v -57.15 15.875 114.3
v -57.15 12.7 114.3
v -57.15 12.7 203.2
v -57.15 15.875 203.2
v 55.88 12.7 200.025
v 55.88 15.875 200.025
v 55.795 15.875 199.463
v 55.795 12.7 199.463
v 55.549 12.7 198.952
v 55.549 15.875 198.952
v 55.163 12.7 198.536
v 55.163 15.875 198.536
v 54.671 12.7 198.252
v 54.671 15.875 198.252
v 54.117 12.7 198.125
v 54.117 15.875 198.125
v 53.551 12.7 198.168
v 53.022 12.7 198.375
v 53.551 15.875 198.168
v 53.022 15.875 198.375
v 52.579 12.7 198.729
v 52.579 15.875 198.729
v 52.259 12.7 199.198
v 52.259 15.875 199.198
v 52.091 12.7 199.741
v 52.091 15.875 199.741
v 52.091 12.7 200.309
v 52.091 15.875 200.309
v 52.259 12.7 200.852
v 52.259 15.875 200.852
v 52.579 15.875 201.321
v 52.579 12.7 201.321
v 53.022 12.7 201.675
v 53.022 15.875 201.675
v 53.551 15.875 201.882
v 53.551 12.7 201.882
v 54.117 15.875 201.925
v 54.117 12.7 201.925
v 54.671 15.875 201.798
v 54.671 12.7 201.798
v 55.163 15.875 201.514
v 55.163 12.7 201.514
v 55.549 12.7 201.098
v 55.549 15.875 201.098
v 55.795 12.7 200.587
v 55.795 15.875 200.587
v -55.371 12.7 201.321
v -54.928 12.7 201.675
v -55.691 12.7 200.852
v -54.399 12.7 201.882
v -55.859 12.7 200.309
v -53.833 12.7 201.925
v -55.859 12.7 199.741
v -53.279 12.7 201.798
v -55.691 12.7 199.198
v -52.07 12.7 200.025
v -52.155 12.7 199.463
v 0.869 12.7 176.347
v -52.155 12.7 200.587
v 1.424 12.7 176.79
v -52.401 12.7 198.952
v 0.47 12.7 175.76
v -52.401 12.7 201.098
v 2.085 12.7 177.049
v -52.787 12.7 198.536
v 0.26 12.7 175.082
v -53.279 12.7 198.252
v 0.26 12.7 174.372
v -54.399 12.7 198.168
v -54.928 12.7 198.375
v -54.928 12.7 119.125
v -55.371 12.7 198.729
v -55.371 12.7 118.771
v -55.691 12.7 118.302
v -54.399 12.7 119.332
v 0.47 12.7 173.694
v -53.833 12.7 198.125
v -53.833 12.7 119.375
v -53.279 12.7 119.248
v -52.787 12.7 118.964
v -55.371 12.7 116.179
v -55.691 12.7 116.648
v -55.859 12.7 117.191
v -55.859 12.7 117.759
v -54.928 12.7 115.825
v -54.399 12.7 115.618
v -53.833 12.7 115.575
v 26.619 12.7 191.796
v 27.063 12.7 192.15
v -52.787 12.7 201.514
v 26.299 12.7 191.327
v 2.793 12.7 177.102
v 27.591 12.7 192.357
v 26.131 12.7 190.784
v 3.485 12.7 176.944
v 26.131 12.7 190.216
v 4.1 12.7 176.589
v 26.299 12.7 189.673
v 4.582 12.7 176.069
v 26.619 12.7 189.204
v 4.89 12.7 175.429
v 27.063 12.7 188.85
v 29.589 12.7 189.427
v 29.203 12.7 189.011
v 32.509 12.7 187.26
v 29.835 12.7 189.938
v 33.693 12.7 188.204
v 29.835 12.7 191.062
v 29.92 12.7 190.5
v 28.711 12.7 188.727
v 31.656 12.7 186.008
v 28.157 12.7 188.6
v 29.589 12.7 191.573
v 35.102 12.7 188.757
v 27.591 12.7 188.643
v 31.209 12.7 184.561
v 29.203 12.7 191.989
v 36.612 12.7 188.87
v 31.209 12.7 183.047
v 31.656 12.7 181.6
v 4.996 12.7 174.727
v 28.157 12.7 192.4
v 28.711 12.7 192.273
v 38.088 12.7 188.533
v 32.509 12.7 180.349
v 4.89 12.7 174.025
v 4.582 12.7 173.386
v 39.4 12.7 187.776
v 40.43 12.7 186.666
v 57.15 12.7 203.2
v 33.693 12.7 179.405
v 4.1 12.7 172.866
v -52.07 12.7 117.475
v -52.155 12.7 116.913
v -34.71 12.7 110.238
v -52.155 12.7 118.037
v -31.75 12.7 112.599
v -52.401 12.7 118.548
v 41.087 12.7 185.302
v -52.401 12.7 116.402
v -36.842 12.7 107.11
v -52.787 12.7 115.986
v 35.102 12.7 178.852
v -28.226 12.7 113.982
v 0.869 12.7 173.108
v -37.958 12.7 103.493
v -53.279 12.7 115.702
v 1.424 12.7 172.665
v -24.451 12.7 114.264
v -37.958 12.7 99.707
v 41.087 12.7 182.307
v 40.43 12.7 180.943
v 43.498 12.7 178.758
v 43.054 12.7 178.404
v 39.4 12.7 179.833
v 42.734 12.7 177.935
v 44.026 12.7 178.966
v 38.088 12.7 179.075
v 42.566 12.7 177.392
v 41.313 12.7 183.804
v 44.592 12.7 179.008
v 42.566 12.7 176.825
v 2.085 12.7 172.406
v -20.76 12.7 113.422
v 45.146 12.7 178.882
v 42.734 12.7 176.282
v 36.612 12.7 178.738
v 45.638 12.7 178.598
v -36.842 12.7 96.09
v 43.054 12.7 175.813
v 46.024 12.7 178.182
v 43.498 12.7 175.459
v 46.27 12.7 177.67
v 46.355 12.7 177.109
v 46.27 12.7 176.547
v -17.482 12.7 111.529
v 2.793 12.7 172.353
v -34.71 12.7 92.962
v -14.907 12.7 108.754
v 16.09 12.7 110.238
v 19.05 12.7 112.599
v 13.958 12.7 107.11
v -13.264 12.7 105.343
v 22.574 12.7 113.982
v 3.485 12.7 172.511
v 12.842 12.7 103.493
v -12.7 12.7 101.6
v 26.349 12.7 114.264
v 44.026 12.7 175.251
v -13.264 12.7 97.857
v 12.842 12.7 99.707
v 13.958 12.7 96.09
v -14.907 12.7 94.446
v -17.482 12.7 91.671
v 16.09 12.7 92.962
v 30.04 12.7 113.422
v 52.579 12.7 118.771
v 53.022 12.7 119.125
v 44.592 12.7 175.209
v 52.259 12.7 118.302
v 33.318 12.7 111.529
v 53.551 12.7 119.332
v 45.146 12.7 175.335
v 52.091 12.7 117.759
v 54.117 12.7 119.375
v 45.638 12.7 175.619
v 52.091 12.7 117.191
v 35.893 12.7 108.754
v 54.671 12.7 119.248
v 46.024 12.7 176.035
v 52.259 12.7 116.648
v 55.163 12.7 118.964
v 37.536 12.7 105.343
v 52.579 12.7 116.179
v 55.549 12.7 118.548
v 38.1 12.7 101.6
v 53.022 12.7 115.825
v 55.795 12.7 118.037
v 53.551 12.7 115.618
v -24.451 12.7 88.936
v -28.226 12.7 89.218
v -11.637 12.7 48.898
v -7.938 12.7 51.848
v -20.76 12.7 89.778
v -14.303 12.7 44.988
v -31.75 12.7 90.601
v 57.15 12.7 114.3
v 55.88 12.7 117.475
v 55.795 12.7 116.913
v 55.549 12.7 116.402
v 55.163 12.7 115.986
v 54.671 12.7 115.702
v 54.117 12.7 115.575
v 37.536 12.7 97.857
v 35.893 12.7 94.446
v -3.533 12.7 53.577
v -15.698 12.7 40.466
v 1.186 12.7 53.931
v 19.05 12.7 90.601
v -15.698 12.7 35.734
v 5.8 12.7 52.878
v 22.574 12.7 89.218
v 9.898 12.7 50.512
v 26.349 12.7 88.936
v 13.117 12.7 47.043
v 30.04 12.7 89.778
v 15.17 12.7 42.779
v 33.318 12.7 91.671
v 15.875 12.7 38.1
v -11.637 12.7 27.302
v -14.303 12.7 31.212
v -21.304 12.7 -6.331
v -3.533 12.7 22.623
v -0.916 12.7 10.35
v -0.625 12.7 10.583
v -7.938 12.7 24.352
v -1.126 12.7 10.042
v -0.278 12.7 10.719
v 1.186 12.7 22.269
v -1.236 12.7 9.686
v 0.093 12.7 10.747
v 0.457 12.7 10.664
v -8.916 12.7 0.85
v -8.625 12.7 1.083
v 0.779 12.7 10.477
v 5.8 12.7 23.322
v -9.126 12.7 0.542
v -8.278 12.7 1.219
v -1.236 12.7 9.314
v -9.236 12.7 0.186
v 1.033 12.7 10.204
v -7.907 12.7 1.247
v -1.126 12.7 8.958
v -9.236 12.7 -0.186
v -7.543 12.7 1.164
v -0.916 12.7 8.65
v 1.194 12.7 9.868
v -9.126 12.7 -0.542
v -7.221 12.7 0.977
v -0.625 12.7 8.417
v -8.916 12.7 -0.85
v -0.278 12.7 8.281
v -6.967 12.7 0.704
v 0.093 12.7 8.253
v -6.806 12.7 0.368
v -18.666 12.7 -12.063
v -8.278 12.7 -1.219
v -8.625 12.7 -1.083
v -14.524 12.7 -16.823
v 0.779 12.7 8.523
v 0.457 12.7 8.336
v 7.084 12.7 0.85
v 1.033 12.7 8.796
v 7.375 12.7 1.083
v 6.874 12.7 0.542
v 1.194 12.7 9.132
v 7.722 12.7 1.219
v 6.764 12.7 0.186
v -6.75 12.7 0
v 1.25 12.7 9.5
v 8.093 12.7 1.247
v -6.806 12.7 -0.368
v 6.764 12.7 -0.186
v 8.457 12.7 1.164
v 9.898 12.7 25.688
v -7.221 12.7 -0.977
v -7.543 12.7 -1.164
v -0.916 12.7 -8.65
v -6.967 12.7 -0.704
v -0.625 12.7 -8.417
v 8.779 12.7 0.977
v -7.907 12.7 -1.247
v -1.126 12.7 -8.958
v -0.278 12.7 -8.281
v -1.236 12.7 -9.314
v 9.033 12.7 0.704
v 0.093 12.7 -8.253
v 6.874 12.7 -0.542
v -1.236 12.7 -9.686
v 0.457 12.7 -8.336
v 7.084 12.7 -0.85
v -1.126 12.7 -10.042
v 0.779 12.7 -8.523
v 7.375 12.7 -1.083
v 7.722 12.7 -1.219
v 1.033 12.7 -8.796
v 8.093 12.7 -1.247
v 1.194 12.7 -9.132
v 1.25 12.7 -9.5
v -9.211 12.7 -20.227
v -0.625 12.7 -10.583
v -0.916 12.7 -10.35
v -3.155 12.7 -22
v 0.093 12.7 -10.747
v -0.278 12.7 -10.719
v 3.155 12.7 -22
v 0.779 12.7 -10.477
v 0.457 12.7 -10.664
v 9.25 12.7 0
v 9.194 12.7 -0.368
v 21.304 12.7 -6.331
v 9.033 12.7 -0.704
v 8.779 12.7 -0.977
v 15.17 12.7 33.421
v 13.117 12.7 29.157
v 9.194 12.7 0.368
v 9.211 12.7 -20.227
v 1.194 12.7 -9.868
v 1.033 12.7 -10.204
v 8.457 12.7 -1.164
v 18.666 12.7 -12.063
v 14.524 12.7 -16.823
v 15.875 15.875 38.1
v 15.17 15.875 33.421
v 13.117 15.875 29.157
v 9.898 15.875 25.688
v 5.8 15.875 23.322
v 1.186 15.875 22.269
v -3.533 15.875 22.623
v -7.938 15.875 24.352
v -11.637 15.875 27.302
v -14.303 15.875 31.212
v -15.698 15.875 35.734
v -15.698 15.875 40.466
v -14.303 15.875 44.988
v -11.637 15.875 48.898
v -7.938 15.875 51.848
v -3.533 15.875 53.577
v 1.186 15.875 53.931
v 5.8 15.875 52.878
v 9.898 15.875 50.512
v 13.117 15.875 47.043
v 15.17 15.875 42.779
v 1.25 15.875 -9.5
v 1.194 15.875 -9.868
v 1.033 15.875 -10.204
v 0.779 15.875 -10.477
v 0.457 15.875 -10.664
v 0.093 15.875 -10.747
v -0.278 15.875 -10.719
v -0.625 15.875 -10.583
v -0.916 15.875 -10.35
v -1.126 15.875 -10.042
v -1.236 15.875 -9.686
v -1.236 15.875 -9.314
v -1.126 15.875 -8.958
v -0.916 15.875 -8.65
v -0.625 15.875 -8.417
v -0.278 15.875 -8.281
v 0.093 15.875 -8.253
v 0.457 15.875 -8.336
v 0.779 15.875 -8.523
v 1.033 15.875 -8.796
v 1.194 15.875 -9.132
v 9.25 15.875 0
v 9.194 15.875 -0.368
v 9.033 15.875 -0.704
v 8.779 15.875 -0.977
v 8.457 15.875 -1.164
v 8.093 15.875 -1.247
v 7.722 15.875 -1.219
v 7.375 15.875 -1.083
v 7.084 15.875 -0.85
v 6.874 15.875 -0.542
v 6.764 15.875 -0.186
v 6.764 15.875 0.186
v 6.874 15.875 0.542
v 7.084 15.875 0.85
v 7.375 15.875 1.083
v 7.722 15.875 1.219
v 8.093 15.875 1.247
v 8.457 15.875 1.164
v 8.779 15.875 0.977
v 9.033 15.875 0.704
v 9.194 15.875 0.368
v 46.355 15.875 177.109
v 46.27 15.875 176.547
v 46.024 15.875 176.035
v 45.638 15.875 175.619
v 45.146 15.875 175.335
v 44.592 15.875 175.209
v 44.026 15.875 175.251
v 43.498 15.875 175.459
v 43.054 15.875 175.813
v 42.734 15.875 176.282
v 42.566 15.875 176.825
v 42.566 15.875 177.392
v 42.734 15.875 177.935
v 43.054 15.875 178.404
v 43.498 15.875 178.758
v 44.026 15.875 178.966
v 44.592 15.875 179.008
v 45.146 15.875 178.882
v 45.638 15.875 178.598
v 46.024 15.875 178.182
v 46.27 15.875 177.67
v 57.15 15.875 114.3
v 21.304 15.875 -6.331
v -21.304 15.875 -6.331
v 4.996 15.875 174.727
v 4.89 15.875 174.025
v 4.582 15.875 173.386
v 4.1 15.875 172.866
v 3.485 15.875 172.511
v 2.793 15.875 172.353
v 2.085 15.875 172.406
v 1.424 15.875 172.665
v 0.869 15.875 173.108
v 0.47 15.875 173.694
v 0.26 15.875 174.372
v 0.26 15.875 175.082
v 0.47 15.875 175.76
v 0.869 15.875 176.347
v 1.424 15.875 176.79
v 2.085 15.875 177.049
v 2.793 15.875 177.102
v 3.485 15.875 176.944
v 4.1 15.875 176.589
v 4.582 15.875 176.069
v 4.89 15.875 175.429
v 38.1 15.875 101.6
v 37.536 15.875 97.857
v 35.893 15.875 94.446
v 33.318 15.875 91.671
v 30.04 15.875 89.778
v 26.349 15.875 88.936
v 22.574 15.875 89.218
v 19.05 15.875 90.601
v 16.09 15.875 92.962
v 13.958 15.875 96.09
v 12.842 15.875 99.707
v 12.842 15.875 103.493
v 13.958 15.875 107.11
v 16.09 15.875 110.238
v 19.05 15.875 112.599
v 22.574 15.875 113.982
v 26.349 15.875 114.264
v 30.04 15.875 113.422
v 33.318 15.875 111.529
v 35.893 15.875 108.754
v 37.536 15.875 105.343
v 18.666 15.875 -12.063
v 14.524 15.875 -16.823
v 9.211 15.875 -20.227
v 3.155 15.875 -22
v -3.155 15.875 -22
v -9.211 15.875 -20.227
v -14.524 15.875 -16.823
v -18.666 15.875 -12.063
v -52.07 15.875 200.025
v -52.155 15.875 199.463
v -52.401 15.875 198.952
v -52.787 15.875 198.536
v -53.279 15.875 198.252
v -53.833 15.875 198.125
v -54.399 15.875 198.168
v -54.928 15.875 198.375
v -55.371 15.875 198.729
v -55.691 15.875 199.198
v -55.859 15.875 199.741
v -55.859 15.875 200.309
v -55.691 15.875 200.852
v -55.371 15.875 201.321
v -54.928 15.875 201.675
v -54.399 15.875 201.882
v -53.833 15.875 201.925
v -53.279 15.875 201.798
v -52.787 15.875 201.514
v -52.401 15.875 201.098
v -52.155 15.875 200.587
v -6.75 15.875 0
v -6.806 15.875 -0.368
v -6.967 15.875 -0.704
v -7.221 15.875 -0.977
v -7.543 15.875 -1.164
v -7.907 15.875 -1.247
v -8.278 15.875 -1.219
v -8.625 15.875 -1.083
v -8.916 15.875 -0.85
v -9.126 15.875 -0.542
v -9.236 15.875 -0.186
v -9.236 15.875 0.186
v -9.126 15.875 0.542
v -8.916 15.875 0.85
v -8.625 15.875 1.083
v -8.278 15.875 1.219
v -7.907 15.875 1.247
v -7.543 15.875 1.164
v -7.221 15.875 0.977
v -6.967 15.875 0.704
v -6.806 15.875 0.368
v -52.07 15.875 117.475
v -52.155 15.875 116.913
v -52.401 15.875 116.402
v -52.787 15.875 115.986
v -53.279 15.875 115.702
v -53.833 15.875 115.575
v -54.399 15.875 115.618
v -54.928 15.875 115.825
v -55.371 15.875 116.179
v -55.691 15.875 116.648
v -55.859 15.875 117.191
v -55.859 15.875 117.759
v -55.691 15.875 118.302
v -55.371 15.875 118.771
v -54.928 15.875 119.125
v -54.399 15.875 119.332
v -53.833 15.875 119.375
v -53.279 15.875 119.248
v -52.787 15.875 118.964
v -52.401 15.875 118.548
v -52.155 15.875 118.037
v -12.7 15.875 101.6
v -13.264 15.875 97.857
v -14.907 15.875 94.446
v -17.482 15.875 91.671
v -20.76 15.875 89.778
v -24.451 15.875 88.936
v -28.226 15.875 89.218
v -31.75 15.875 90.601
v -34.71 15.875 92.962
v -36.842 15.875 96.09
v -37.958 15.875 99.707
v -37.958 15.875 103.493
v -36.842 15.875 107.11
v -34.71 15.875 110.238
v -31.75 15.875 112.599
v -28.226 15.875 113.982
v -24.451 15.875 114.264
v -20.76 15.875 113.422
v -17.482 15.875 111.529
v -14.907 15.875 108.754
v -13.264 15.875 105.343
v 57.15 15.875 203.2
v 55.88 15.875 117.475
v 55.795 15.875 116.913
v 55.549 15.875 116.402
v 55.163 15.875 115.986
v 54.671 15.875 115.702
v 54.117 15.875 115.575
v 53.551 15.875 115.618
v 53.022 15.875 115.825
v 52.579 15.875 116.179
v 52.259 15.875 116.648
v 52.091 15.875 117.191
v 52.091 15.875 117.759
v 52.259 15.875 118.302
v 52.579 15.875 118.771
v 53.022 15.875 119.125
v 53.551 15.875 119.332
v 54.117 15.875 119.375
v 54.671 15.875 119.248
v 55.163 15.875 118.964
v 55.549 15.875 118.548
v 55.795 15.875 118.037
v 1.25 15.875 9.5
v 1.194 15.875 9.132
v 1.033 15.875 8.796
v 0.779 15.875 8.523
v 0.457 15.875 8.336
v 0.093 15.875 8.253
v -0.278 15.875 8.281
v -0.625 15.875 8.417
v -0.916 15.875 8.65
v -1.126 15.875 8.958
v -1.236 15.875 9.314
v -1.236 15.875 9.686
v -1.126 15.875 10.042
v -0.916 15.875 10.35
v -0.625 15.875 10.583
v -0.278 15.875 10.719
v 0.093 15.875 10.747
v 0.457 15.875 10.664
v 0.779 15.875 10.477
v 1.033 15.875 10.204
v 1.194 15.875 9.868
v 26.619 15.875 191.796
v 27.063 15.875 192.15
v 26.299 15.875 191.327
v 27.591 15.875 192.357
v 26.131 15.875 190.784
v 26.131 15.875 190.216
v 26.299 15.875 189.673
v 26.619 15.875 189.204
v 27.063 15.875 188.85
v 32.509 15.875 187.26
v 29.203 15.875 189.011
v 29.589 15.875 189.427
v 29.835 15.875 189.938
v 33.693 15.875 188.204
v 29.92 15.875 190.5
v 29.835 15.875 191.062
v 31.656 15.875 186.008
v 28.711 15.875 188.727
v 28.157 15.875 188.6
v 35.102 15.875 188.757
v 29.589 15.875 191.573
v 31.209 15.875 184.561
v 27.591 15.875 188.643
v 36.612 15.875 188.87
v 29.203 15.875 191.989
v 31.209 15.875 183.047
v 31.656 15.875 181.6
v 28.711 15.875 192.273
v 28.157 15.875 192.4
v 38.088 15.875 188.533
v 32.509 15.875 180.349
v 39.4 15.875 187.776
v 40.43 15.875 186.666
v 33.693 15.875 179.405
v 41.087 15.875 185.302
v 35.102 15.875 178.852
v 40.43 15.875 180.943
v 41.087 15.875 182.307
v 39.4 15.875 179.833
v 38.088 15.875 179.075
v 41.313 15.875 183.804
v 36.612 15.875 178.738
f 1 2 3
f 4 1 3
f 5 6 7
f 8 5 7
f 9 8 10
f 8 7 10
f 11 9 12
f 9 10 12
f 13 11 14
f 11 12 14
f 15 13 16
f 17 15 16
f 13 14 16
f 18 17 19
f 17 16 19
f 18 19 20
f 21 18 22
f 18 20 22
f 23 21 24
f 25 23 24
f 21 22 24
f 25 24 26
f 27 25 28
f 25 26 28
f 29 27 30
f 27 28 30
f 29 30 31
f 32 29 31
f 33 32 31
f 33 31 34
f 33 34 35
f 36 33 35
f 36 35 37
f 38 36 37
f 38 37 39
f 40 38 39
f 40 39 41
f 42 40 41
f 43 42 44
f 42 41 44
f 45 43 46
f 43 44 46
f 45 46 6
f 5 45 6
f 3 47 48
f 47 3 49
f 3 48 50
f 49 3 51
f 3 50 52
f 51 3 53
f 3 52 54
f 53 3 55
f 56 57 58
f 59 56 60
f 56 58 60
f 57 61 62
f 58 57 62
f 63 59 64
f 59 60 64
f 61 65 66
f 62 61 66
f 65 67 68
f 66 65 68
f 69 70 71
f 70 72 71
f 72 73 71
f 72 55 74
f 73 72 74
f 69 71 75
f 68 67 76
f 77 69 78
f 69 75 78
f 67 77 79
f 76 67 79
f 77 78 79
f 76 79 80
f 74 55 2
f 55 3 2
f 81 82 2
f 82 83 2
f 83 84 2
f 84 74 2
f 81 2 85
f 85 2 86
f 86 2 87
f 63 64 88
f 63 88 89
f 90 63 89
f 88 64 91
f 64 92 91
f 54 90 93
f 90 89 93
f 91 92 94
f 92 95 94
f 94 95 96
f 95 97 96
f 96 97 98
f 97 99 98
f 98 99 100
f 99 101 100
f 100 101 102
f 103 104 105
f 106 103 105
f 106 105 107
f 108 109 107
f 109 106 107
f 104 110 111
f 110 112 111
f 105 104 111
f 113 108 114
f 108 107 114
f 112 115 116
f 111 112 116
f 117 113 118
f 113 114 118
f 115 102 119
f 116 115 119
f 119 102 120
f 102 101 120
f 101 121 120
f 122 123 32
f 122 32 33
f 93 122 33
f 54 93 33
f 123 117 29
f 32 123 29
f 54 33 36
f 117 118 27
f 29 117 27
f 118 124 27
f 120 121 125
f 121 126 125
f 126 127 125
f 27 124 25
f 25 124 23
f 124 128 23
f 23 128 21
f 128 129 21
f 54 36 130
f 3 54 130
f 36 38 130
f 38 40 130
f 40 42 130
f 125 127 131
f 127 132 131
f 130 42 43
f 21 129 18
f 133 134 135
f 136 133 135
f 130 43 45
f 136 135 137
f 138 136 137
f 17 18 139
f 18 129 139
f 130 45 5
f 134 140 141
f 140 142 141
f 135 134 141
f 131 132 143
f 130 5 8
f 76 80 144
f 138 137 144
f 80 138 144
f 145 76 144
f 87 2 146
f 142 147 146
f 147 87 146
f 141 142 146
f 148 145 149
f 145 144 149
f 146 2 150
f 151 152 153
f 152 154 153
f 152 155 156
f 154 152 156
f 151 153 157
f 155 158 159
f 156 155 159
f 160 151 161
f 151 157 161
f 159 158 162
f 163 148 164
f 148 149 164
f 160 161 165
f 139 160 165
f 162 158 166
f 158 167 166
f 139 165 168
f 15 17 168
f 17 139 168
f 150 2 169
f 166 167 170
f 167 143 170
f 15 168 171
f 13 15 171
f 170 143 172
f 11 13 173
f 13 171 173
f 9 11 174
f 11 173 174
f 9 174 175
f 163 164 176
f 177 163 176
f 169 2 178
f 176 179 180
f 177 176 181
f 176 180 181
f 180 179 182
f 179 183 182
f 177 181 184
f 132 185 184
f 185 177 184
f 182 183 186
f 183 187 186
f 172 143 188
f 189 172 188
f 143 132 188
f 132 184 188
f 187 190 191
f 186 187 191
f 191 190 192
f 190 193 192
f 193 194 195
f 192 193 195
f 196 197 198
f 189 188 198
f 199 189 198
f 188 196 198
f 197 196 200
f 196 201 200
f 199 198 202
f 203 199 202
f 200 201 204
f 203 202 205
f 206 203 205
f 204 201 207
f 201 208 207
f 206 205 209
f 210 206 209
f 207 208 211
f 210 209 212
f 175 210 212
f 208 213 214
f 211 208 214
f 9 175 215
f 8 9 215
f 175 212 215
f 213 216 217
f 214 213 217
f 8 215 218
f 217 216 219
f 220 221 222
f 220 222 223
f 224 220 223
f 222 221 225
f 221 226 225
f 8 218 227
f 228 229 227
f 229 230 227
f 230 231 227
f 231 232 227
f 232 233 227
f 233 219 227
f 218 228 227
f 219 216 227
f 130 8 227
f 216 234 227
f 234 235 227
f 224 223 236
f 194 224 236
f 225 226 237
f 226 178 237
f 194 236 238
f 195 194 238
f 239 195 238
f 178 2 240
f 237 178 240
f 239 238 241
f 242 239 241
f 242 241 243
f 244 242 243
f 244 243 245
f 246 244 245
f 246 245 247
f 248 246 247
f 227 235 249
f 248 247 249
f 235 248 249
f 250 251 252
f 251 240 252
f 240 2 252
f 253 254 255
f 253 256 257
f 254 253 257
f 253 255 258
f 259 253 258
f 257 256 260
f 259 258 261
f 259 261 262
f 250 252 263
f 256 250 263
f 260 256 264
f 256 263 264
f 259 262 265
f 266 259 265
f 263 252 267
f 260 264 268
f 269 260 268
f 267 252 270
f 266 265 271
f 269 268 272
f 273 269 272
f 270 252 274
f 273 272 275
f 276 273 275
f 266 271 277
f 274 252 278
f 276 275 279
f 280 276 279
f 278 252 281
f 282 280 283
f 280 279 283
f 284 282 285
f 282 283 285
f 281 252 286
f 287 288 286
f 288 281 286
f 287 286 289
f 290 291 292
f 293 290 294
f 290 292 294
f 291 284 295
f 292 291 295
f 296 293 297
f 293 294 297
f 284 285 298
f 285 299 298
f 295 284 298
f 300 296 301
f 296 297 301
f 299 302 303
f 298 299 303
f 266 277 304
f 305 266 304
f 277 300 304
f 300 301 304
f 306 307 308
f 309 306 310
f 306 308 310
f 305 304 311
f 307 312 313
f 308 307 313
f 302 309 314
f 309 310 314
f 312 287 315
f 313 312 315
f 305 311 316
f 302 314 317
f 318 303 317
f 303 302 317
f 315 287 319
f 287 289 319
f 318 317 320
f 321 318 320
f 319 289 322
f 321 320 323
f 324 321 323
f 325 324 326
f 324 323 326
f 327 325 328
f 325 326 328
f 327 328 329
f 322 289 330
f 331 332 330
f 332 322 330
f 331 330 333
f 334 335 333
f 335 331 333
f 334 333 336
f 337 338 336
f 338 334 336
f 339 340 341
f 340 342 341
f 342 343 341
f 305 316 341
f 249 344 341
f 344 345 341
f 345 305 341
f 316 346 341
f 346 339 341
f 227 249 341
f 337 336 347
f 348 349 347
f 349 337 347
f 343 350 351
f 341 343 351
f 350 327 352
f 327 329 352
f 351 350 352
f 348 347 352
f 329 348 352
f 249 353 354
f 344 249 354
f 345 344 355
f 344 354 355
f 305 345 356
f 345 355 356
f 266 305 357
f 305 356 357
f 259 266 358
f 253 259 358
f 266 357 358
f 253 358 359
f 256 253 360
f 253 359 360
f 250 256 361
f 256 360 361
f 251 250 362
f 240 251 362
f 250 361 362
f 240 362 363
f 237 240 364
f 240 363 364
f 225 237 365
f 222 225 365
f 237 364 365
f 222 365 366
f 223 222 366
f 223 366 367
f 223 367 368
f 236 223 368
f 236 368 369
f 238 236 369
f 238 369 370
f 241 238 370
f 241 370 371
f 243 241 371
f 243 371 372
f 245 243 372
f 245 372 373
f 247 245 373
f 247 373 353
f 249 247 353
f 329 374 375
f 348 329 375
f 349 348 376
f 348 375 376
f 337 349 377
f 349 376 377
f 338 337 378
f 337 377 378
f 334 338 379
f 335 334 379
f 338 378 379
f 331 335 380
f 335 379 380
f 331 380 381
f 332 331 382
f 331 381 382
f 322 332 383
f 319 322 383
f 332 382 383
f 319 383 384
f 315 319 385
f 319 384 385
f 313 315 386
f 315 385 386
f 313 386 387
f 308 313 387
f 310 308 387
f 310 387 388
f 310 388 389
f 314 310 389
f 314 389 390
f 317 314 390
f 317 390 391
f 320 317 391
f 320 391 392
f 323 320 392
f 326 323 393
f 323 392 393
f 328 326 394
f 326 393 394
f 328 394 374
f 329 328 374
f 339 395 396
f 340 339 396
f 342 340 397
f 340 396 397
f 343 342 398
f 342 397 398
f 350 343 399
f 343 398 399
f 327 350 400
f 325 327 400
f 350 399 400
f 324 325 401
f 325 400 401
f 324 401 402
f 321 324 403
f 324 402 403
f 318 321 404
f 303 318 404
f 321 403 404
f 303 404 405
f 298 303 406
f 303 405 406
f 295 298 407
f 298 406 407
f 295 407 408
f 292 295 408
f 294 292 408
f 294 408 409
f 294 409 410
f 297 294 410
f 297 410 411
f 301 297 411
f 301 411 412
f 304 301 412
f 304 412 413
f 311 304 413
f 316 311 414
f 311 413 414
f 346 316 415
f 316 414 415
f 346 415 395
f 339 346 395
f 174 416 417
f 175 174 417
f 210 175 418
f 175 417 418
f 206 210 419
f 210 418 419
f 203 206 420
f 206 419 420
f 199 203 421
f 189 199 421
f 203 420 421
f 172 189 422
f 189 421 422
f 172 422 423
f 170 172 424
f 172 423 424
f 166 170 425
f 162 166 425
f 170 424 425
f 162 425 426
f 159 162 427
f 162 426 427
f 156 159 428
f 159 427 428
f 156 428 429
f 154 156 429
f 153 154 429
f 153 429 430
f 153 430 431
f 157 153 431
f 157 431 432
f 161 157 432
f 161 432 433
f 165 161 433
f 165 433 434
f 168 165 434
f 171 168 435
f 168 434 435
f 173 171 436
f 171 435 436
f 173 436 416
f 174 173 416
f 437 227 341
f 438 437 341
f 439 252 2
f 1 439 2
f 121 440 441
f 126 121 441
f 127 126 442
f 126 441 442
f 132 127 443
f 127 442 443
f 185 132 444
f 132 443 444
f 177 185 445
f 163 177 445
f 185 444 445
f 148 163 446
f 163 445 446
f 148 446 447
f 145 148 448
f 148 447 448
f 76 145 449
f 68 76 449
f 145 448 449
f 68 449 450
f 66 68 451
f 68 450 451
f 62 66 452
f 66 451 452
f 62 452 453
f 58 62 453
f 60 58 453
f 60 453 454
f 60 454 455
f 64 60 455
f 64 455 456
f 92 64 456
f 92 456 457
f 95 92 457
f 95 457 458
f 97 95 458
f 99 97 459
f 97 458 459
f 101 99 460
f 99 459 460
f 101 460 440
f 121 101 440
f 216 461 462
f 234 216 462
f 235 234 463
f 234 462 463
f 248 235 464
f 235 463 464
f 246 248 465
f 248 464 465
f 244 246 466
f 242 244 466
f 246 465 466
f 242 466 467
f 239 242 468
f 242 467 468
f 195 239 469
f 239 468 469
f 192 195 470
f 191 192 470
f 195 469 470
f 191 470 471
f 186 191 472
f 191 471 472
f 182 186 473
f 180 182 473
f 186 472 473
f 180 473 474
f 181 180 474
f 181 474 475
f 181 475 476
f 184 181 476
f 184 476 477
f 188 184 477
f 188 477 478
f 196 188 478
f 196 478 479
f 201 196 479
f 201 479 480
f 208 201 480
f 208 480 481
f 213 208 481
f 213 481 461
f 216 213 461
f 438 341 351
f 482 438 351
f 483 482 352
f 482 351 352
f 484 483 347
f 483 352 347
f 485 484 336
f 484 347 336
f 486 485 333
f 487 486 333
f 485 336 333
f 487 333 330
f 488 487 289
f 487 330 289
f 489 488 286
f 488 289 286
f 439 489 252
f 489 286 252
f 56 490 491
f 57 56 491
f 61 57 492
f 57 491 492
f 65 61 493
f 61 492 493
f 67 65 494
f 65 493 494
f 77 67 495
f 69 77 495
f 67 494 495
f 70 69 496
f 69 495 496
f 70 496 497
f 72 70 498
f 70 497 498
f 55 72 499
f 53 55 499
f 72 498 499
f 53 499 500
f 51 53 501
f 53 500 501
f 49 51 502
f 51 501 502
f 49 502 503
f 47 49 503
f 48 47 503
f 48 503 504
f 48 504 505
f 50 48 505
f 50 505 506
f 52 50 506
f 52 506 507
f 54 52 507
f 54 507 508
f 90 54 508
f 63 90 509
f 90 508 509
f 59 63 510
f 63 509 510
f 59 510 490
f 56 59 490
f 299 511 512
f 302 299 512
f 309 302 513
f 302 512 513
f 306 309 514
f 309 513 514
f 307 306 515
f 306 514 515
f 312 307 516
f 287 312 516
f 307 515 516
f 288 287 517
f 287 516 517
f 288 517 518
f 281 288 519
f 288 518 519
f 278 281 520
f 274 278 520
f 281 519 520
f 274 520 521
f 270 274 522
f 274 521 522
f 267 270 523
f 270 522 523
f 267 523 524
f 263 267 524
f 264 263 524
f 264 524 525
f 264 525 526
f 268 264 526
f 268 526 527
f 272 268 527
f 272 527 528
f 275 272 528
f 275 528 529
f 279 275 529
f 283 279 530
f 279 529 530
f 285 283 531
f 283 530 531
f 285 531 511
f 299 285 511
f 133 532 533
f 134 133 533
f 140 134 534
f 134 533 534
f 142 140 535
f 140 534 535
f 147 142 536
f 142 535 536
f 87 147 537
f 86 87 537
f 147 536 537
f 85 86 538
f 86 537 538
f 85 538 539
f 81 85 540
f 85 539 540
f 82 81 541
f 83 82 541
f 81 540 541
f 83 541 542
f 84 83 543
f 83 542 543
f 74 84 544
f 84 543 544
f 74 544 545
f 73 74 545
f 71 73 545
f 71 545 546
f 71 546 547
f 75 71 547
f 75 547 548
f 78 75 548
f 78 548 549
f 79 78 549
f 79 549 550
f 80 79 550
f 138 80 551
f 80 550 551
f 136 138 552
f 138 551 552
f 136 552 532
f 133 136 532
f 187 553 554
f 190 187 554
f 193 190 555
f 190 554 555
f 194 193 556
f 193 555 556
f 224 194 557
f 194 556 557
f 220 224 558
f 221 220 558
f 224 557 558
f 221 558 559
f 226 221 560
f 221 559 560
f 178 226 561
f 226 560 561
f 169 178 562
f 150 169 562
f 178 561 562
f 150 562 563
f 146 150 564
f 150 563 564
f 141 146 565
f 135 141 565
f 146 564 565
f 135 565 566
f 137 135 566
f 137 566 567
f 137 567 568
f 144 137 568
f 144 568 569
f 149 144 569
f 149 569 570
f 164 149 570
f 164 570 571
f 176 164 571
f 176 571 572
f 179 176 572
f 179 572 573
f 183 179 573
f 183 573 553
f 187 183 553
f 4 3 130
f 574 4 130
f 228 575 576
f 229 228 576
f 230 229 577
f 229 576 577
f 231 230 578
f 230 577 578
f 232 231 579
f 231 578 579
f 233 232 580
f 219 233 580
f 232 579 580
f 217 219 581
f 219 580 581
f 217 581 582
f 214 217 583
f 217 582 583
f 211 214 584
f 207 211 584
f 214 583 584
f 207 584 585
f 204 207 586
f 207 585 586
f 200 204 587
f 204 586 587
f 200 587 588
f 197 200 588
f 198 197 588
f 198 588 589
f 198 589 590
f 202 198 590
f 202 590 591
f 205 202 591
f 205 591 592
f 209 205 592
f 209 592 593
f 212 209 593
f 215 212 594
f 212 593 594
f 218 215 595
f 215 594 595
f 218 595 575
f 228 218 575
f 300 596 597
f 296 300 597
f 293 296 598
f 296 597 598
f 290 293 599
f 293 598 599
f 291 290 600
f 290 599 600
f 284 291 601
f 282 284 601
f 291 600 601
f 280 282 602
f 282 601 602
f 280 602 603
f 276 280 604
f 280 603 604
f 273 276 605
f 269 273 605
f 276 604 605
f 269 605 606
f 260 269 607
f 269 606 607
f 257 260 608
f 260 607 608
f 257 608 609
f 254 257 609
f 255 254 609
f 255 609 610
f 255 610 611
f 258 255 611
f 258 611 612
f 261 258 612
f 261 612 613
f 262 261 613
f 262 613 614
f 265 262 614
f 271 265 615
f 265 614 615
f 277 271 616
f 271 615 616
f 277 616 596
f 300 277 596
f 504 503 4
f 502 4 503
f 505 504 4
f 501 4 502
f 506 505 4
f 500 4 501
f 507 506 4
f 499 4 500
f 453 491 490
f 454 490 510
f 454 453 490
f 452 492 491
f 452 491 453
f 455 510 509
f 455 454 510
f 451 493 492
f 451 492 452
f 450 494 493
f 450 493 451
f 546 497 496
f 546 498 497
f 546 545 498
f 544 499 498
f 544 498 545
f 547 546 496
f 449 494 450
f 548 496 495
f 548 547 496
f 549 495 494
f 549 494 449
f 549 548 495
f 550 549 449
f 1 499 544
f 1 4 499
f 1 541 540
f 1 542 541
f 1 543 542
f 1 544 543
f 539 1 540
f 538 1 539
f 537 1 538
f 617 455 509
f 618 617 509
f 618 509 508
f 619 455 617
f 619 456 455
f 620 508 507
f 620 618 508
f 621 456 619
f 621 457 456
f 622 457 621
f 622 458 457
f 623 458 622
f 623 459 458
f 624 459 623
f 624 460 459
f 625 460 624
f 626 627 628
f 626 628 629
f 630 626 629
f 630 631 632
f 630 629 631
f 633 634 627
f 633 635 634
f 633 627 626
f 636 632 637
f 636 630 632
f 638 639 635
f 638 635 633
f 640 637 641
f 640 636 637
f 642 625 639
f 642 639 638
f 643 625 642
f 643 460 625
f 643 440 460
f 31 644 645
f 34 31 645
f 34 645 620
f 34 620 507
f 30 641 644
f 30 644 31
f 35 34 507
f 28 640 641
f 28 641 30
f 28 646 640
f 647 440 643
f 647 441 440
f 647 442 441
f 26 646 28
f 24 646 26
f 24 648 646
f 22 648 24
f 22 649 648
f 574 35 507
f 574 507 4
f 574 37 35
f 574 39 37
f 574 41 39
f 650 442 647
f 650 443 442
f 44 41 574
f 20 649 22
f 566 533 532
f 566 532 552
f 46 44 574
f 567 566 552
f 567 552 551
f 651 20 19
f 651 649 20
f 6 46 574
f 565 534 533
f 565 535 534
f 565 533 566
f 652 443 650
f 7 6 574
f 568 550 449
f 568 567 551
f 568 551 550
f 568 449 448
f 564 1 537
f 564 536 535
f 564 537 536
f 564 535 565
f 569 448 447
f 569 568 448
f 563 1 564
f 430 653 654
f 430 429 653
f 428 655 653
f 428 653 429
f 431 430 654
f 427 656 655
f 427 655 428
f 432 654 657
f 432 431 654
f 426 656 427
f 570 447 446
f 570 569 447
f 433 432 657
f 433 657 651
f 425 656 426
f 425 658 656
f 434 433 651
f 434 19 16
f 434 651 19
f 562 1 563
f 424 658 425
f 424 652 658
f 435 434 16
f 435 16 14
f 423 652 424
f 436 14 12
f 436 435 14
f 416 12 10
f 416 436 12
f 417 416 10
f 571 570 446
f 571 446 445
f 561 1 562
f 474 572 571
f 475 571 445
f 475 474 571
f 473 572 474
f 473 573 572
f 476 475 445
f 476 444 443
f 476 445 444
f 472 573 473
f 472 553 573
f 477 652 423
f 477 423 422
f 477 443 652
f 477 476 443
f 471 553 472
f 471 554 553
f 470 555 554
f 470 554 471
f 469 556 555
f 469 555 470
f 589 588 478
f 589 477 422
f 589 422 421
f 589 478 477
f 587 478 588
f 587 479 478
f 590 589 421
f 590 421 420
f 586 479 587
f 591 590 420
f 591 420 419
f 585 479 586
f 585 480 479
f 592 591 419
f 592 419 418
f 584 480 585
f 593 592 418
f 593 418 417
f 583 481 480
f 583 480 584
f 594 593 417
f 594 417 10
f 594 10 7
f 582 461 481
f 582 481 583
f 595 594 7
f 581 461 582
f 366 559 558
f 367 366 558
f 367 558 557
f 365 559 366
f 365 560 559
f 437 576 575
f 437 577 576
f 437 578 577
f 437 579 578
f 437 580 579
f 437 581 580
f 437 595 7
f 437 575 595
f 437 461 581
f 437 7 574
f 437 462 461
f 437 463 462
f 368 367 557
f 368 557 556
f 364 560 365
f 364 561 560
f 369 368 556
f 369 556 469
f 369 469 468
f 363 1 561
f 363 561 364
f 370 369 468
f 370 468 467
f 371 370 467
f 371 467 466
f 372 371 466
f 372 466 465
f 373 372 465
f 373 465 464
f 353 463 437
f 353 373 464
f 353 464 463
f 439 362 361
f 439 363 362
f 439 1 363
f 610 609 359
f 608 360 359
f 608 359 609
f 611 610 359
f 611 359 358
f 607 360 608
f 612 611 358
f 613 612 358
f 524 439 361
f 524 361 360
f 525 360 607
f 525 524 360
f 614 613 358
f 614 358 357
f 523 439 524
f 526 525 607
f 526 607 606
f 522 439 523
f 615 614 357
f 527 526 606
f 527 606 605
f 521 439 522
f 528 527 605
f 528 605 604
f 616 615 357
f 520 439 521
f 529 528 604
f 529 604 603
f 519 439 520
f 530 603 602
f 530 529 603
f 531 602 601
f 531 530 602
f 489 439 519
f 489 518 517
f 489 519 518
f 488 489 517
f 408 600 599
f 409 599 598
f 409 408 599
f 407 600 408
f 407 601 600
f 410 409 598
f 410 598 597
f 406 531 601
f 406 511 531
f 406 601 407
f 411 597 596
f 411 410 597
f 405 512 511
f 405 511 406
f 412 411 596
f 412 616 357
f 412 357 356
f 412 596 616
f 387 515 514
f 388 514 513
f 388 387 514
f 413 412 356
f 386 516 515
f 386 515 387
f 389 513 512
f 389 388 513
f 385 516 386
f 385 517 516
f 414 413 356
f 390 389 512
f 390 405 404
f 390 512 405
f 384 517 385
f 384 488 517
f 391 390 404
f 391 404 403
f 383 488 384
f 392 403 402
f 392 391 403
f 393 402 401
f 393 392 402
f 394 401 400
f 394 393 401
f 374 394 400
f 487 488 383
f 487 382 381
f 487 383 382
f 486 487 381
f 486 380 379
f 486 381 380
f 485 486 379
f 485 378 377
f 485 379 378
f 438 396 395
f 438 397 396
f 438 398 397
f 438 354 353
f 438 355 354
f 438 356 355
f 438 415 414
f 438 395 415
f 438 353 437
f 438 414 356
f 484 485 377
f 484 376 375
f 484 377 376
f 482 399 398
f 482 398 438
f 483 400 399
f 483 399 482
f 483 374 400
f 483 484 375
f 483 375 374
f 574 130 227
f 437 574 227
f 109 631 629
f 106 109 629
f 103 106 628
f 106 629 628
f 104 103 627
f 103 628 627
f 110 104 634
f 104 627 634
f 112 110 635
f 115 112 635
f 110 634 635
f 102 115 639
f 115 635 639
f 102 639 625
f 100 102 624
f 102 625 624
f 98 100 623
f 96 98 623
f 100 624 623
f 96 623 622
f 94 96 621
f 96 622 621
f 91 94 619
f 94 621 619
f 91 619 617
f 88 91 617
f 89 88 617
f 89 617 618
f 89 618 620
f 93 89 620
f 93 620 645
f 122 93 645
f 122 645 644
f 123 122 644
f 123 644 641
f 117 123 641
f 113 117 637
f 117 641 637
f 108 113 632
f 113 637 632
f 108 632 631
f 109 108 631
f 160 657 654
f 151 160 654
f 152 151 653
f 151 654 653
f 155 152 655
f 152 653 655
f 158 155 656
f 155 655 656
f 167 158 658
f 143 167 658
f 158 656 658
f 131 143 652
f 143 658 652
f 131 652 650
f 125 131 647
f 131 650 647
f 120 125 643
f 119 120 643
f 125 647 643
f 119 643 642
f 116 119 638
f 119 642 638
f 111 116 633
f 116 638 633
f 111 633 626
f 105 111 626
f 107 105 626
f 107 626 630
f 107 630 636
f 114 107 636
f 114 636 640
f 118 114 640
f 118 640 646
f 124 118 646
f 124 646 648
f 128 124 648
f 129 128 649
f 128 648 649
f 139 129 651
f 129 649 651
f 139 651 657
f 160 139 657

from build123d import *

# Parameters (mm, degrees)
SKETCH3_W                = 114.3
SKETCH3_H                = 88.9
SKETCH3_W_2              = 101.6
SKETCH3_H_2              = 76.2
BOSS_EXTRUDE1_DEPTH      = 12.7
BOSS_EXTRUDE1_DEPTH_BACK = 12.7
SKETCH4_W                = 114.3
SKETCH4_H                = 88.9
BOSS_EXTRUDE2_DEPTH      = 3.175
BOSS_EXTRUDE3_DEPTH      = 3.175
SKETCH7_W                = 44.45
SKETCH7_H                = 25.4
BOSS_EXTRUDE4_DEPTH      = 6.35
SKETCH6_R                = 9.9695
CUT_EXTRUDE1_DEPTH       = 115.3
SKETCH13_W               = 29.21
SKETCH13_H               = 25.4
BOSS_EXTRUDE5_DEPTH      = 4.064
SKETCH14_W               = 6.35
SKETCH14_H               = 2.54
CUT_EXTRUDE2_DEPTH       = 31.75
SKETCH18_W               = 10.16
SKETCH18_H               = 5.08
CUT_EXTRUDE3_DEPTH       = 6.35
SKETCH19_R               = 0.635
CUT_EXTRUDE4_DEPTH       = 25.4
SKETCH20_R               = 1.905
CUT_EXTRUDE7_DEPTH       = 3.175
SKETCH23_R               = 5.08
SKETCH23_R_2             = 1.905
SKETCH23_R_3             = 2.38125
CUT_EXTRUDE8_DEPTH       = 3.175
SKETCH24_R               = 1.25
CUT_EXTRUDE9_DEPTH       = 3.175
BOSS_EXTRUDE7_DEPTH      = 114.3
BOSS_EXTRUDE8_DEPTH      = 28.575
SKETCH25_R               = 15.875
SKETCH25_R_2             = 12.7
CUT_EXTRUDE10_DEPTH      = 32.75
FILLET1_R                = 9.525
FILLET2_R                = 5.08
FILLET3_R                = 9.525


with BuildPart() as part:
    # Sketch3 → Boss-Extrude1 (new body, two sides)
    with BuildSketch(Plane(origin=(0, 0, 0), x_dir=(1, 0, 0), z_dir=(0, 1, 0))) as boss_extrude1_sk:
        with Locations((0, -158.75)):
            Rectangle(SKETCH3_W, SKETCH3_H)
        with Locations((0, -158.75)):
            Rectangle(SKETCH3_W_2, SKETCH3_H_2, mode=Mode.SUBTRACT)
    extrude(amount=BOSS_EXTRUDE1_DEPTH)
    extrude(boss_extrude1_sk.sketch, amount=-BOSS_EXTRUDE1_DEPTH_BACK)

    # Sketch4 → Boss-Extrude2 (add)
    with BuildSketch(Plane.XZ.offset(12.7)):
        with Locations((0, 158.75)):
            Rectangle(SKETCH4_W, SKETCH4_H)
    extrude(amount=BOSS_EXTRUDE2_DEPTH)

    # Sketch7 → Boss-Extrude4 (add)
    with BuildSketch(Plane(origin=(0, -12.7, 0), x_dir=(1, 0, 0), z_dir=(0, 1, 0))):
        with Locations((-28.575, -133.35)):
            Rectangle(SKETCH7_W, SKETCH7_H)
        with Locations((28.575, -133.35)):
            Rectangle(SKETCH7_W, SKETCH7_H)
    extrude(amount=BOSS_EXTRUDE4_DEPTH)

    # Sketch6 → Cut-Extrude1 (cut, through all)
    with BuildSketch(Plane.ZY.offset(57.15)):
        with Locations((133.35, 0)):
            Circle(SKETCH6_R)
    extrude(amount=-CUT_EXTRUDE1_DEPTH, mode=Mode.SUBTRACT)

    # Sketch13 → Boss-Extrude5 (add)
    with BuildSketch(Plane(origin=(0, -12.7, 0), x_dir=(1, 0, 0), z_dir=(0, 1, 0))):
        with Locations((-20.955, -133.35)):
            Rectangle(SKETCH13_W, SKETCH13_H)
        with Locations((20.955, -133.35)):
            Rectangle(SKETCH13_W, SKETCH13_H)
    extrude(amount=BOSS_EXTRUDE5_DEPTH)

    # Sketch14 → Cut-Extrude2 (cut)
    with BuildSketch(Plane.XY.offset(146.05)):
        with Locations((-27.305, -10.414)):
            Rectangle(SKETCH14_W, SKETCH14_H)
        with Locations((-27.305, -3.81)):
            Rectangle(SKETCH14_W, SKETCH14_H)
        with Locations((27.305, -10.414)):
            Rectangle(SKETCH14_W, SKETCH14_H)
        with Locations((27.305, -3.81)):
            Rectangle(SKETCH14_W, SKETCH14_H)
    extrude(amount=-CUT_EXTRUDE2_DEPTH, mode=Mode.SUBTRACT)

    # Sketch18 → Cut-Extrude3 (cut)
    with BuildSketch(Plane.XY.offset(120.65)):
        with Locations((-43.18, 10.16)):
            Rectangle(SKETCH18_W, SKETCH18_H)
    extrude(amount=-CUT_EXTRUDE3_DEPTH, mode=Mode.SUBTRACT)

    # Sketch19 → Cut-Extrude4 (cut)
    with BuildSketch(Plane(origin=(0, 12.7, 0), x_dir=(1, 0, 0), z_dir=(0, 1, 0))):
        with Locations((-53.975, -117.475)):
            Circle(SKETCH19_R)
        with Locations((53.975, -117.475)):
            Circle(SKETCH19_R)
        with Locations((-53.975, -200.025)):
            Circle(SKETCH19_R)
        with Locations((53.975, -200.025)):
            Circle(SKETCH19_R)
    extrude(amount=-CUT_EXTRUDE4_DEPTH, mode=Mode.SUBTRACT)

    # Sketch26 → Boss-Extrude7 (add)
    with BuildSketch(Plane(origin=(57.15, 0, 0), x_dir=(0, 0, -1), z_dir=(1, 0, 0))):
        Polygon((-203.2, 12.7), (-203.454, 12.7), (-203.454, 15.875), (-204.724, 15.875), (-213.23138686, -15.875), (-203.2, -15.875), align=None)
    extrude(amount=-BOSS_EXTRUDE7_DEPTH)

    # Sketch27 → Boss-Extrude8 (add)
    with BuildSketch(Plane.XZ.offset(15.875)):
        Polygon((57.15, 171.45), (95.25, 171.45), (95.25, 128.27), (100.33, 128.27), (100.33, 176.536200973), (57.15, 184.15), align=None)
        Polygon((-100.33, 176.536200973), (-57.15, 184.15), (-57.15, 171.45), (-95.25, 171.45), (-95.25, 128.27), (-100.33, 128.27), align=None)
    extrude(amount=-BOSS_EXTRUDE8_DEPTH)

    # Fillet1
    fillet1_edges = [part.edges().sort_by_distance(p)[0] for p in [
        (57.15, -1.5875, 184.15),
        (100.33, -1.5875, 176.536200973),
        (95.25, -1.5875, 171.45),
        (-100.33, -1.5875, 176.536200973),
        (-57.15, -1.5875, 184.15),
        (-95.25, -1.5875, 171.45),
    ]]
    fillet(fillet1_edges, radius=FILLET1_R)

    # Fillet2
    fillet2_edges = [part.edges().sort_by_distance(p)[0] for p in [
        (57.15, -1.5875, 171.45),
        (-57.15, -1.5875, 171.45),
    ]]
    fillet(fillet2_edges, radius=FILLET2_R)

    # Fillet3
    fillet3_edges = [part.edges().sort_by_distance(p)[0] for p in [
        (97.79, -15.875, 128.27),
        (97.79, 12.7, 128.27),
        (-97.79, -15.875, 128.27),
        (-97.79, 12.7, 128.27),
    ]]
    fillet(fillet3_edges, radius=FILLET3_R)


with BuildPart() as body_2:
    # Sketch5 → Boss-Extrude3 (new body)
    with BuildSketch(Plane(origin=(0, 12.7, 0), x_dir=(1, 0, 0), z_dir=(0, 1, 0))):
        with BuildLine():
            Line((-21.304313257, 6.330628851), (-57.15, -114.3))
            Line((-57.15, -114.3), (-57.15, -203.2))
            Line((-57.15, -203.2), (57.15, -203.2))
            Line((57.15, -203.2), (57.15, -114.3))
            Line((57.15, -114.3), (21.304313257, 6.330628851))
            ThreePointArc((21.304313257, 6.330628851), (0, 22.225), (-21.304313257, 6.330628851))
        make_face()
    extrude(amount=BOSS_EXTRUDE3_DEPTH)

    # Sketch20 → Cut-Extrude7 (cut)
    with BuildSketch(Plane(origin=(0, 15.875, 0), x_dir=(1, 0, 0), z_dir=(0, 1, 0))):
        with Locations((-53.975, -117.475)):
            Circle(SKETCH20_R)
        with Locations((-53.975, -200.025)):
            Circle(SKETCH20_R)
        with Locations((53.975, -200.025)):
            Circle(SKETCH20_R)
        with Locations((53.975, -117.475)):
            Circle(SKETCH20_R)
    extrude(amount=-CUT_EXTRUDE7_DEPTH, mode=Mode.SUBTRACT)

    # Sketch23 → Cut-Extrude8 (cut)
    with BuildSketch(Plane(origin=(0, 15.875, 0), x_dir=(1, 0, 0), z_dir=(0, 1, 0))):
        with Locations((36.232509154, -183.804266718)):
            Circle(SKETCH23_R)
        with Locations((44.45, -177.108533435)):
            Circle(SKETCH23_R_2)
        with Locations((28.015018307, -190.5)):
            Circle(SKETCH23_R_2)
        with Locations((2.615018307, -174.727283435)):
            Circle(SKETCH23_R_3)
    extrude(amount=-CUT_EXTRUDE8_DEPTH, mode=Mode.SUBTRACT)

    # Sketch24 → Cut-Extrude9 (cut)
    with BuildSketch(Plane(origin=(0, 15.875, 0), x_dir=(1, 0, 0), z_dir=(0, 1, 0))):
        with Locations((0, 9.5)):
            Circle(SKETCH24_R)
        with Locations((0, -9.5)):
            Circle(SKETCH24_R)
        with Locations((-8, 0)):
            Circle(SKETCH24_R)
        with Locations((8, 0)):
            Circle(SKETCH24_R)
    extrude(amount=-CUT_EXTRUDE9_DEPTH, mode=Mode.SUBTRACT)

    # Sketch25 → Cut-Extrude10 (cut, through all)
    with BuildSketch(Plane(origin=(0, 15.875, 0), x_dir=(1, 0, 0), z_dir=(0, 1, 0))):
        with Locations((0, -38.1)):
            Circle(SKETCH25_R)
        with Locations((-25.4, -101.6)):
            Circle(SKETCH25_R_2)
        with Locations((25.4, -101.6)):
            Circle(SKETCH25_R_2)
    extrude(amount=-CUT_EXTRUDE10_DEPTH, mode=Mode.SUBTRACT)


solid = body_2.part
